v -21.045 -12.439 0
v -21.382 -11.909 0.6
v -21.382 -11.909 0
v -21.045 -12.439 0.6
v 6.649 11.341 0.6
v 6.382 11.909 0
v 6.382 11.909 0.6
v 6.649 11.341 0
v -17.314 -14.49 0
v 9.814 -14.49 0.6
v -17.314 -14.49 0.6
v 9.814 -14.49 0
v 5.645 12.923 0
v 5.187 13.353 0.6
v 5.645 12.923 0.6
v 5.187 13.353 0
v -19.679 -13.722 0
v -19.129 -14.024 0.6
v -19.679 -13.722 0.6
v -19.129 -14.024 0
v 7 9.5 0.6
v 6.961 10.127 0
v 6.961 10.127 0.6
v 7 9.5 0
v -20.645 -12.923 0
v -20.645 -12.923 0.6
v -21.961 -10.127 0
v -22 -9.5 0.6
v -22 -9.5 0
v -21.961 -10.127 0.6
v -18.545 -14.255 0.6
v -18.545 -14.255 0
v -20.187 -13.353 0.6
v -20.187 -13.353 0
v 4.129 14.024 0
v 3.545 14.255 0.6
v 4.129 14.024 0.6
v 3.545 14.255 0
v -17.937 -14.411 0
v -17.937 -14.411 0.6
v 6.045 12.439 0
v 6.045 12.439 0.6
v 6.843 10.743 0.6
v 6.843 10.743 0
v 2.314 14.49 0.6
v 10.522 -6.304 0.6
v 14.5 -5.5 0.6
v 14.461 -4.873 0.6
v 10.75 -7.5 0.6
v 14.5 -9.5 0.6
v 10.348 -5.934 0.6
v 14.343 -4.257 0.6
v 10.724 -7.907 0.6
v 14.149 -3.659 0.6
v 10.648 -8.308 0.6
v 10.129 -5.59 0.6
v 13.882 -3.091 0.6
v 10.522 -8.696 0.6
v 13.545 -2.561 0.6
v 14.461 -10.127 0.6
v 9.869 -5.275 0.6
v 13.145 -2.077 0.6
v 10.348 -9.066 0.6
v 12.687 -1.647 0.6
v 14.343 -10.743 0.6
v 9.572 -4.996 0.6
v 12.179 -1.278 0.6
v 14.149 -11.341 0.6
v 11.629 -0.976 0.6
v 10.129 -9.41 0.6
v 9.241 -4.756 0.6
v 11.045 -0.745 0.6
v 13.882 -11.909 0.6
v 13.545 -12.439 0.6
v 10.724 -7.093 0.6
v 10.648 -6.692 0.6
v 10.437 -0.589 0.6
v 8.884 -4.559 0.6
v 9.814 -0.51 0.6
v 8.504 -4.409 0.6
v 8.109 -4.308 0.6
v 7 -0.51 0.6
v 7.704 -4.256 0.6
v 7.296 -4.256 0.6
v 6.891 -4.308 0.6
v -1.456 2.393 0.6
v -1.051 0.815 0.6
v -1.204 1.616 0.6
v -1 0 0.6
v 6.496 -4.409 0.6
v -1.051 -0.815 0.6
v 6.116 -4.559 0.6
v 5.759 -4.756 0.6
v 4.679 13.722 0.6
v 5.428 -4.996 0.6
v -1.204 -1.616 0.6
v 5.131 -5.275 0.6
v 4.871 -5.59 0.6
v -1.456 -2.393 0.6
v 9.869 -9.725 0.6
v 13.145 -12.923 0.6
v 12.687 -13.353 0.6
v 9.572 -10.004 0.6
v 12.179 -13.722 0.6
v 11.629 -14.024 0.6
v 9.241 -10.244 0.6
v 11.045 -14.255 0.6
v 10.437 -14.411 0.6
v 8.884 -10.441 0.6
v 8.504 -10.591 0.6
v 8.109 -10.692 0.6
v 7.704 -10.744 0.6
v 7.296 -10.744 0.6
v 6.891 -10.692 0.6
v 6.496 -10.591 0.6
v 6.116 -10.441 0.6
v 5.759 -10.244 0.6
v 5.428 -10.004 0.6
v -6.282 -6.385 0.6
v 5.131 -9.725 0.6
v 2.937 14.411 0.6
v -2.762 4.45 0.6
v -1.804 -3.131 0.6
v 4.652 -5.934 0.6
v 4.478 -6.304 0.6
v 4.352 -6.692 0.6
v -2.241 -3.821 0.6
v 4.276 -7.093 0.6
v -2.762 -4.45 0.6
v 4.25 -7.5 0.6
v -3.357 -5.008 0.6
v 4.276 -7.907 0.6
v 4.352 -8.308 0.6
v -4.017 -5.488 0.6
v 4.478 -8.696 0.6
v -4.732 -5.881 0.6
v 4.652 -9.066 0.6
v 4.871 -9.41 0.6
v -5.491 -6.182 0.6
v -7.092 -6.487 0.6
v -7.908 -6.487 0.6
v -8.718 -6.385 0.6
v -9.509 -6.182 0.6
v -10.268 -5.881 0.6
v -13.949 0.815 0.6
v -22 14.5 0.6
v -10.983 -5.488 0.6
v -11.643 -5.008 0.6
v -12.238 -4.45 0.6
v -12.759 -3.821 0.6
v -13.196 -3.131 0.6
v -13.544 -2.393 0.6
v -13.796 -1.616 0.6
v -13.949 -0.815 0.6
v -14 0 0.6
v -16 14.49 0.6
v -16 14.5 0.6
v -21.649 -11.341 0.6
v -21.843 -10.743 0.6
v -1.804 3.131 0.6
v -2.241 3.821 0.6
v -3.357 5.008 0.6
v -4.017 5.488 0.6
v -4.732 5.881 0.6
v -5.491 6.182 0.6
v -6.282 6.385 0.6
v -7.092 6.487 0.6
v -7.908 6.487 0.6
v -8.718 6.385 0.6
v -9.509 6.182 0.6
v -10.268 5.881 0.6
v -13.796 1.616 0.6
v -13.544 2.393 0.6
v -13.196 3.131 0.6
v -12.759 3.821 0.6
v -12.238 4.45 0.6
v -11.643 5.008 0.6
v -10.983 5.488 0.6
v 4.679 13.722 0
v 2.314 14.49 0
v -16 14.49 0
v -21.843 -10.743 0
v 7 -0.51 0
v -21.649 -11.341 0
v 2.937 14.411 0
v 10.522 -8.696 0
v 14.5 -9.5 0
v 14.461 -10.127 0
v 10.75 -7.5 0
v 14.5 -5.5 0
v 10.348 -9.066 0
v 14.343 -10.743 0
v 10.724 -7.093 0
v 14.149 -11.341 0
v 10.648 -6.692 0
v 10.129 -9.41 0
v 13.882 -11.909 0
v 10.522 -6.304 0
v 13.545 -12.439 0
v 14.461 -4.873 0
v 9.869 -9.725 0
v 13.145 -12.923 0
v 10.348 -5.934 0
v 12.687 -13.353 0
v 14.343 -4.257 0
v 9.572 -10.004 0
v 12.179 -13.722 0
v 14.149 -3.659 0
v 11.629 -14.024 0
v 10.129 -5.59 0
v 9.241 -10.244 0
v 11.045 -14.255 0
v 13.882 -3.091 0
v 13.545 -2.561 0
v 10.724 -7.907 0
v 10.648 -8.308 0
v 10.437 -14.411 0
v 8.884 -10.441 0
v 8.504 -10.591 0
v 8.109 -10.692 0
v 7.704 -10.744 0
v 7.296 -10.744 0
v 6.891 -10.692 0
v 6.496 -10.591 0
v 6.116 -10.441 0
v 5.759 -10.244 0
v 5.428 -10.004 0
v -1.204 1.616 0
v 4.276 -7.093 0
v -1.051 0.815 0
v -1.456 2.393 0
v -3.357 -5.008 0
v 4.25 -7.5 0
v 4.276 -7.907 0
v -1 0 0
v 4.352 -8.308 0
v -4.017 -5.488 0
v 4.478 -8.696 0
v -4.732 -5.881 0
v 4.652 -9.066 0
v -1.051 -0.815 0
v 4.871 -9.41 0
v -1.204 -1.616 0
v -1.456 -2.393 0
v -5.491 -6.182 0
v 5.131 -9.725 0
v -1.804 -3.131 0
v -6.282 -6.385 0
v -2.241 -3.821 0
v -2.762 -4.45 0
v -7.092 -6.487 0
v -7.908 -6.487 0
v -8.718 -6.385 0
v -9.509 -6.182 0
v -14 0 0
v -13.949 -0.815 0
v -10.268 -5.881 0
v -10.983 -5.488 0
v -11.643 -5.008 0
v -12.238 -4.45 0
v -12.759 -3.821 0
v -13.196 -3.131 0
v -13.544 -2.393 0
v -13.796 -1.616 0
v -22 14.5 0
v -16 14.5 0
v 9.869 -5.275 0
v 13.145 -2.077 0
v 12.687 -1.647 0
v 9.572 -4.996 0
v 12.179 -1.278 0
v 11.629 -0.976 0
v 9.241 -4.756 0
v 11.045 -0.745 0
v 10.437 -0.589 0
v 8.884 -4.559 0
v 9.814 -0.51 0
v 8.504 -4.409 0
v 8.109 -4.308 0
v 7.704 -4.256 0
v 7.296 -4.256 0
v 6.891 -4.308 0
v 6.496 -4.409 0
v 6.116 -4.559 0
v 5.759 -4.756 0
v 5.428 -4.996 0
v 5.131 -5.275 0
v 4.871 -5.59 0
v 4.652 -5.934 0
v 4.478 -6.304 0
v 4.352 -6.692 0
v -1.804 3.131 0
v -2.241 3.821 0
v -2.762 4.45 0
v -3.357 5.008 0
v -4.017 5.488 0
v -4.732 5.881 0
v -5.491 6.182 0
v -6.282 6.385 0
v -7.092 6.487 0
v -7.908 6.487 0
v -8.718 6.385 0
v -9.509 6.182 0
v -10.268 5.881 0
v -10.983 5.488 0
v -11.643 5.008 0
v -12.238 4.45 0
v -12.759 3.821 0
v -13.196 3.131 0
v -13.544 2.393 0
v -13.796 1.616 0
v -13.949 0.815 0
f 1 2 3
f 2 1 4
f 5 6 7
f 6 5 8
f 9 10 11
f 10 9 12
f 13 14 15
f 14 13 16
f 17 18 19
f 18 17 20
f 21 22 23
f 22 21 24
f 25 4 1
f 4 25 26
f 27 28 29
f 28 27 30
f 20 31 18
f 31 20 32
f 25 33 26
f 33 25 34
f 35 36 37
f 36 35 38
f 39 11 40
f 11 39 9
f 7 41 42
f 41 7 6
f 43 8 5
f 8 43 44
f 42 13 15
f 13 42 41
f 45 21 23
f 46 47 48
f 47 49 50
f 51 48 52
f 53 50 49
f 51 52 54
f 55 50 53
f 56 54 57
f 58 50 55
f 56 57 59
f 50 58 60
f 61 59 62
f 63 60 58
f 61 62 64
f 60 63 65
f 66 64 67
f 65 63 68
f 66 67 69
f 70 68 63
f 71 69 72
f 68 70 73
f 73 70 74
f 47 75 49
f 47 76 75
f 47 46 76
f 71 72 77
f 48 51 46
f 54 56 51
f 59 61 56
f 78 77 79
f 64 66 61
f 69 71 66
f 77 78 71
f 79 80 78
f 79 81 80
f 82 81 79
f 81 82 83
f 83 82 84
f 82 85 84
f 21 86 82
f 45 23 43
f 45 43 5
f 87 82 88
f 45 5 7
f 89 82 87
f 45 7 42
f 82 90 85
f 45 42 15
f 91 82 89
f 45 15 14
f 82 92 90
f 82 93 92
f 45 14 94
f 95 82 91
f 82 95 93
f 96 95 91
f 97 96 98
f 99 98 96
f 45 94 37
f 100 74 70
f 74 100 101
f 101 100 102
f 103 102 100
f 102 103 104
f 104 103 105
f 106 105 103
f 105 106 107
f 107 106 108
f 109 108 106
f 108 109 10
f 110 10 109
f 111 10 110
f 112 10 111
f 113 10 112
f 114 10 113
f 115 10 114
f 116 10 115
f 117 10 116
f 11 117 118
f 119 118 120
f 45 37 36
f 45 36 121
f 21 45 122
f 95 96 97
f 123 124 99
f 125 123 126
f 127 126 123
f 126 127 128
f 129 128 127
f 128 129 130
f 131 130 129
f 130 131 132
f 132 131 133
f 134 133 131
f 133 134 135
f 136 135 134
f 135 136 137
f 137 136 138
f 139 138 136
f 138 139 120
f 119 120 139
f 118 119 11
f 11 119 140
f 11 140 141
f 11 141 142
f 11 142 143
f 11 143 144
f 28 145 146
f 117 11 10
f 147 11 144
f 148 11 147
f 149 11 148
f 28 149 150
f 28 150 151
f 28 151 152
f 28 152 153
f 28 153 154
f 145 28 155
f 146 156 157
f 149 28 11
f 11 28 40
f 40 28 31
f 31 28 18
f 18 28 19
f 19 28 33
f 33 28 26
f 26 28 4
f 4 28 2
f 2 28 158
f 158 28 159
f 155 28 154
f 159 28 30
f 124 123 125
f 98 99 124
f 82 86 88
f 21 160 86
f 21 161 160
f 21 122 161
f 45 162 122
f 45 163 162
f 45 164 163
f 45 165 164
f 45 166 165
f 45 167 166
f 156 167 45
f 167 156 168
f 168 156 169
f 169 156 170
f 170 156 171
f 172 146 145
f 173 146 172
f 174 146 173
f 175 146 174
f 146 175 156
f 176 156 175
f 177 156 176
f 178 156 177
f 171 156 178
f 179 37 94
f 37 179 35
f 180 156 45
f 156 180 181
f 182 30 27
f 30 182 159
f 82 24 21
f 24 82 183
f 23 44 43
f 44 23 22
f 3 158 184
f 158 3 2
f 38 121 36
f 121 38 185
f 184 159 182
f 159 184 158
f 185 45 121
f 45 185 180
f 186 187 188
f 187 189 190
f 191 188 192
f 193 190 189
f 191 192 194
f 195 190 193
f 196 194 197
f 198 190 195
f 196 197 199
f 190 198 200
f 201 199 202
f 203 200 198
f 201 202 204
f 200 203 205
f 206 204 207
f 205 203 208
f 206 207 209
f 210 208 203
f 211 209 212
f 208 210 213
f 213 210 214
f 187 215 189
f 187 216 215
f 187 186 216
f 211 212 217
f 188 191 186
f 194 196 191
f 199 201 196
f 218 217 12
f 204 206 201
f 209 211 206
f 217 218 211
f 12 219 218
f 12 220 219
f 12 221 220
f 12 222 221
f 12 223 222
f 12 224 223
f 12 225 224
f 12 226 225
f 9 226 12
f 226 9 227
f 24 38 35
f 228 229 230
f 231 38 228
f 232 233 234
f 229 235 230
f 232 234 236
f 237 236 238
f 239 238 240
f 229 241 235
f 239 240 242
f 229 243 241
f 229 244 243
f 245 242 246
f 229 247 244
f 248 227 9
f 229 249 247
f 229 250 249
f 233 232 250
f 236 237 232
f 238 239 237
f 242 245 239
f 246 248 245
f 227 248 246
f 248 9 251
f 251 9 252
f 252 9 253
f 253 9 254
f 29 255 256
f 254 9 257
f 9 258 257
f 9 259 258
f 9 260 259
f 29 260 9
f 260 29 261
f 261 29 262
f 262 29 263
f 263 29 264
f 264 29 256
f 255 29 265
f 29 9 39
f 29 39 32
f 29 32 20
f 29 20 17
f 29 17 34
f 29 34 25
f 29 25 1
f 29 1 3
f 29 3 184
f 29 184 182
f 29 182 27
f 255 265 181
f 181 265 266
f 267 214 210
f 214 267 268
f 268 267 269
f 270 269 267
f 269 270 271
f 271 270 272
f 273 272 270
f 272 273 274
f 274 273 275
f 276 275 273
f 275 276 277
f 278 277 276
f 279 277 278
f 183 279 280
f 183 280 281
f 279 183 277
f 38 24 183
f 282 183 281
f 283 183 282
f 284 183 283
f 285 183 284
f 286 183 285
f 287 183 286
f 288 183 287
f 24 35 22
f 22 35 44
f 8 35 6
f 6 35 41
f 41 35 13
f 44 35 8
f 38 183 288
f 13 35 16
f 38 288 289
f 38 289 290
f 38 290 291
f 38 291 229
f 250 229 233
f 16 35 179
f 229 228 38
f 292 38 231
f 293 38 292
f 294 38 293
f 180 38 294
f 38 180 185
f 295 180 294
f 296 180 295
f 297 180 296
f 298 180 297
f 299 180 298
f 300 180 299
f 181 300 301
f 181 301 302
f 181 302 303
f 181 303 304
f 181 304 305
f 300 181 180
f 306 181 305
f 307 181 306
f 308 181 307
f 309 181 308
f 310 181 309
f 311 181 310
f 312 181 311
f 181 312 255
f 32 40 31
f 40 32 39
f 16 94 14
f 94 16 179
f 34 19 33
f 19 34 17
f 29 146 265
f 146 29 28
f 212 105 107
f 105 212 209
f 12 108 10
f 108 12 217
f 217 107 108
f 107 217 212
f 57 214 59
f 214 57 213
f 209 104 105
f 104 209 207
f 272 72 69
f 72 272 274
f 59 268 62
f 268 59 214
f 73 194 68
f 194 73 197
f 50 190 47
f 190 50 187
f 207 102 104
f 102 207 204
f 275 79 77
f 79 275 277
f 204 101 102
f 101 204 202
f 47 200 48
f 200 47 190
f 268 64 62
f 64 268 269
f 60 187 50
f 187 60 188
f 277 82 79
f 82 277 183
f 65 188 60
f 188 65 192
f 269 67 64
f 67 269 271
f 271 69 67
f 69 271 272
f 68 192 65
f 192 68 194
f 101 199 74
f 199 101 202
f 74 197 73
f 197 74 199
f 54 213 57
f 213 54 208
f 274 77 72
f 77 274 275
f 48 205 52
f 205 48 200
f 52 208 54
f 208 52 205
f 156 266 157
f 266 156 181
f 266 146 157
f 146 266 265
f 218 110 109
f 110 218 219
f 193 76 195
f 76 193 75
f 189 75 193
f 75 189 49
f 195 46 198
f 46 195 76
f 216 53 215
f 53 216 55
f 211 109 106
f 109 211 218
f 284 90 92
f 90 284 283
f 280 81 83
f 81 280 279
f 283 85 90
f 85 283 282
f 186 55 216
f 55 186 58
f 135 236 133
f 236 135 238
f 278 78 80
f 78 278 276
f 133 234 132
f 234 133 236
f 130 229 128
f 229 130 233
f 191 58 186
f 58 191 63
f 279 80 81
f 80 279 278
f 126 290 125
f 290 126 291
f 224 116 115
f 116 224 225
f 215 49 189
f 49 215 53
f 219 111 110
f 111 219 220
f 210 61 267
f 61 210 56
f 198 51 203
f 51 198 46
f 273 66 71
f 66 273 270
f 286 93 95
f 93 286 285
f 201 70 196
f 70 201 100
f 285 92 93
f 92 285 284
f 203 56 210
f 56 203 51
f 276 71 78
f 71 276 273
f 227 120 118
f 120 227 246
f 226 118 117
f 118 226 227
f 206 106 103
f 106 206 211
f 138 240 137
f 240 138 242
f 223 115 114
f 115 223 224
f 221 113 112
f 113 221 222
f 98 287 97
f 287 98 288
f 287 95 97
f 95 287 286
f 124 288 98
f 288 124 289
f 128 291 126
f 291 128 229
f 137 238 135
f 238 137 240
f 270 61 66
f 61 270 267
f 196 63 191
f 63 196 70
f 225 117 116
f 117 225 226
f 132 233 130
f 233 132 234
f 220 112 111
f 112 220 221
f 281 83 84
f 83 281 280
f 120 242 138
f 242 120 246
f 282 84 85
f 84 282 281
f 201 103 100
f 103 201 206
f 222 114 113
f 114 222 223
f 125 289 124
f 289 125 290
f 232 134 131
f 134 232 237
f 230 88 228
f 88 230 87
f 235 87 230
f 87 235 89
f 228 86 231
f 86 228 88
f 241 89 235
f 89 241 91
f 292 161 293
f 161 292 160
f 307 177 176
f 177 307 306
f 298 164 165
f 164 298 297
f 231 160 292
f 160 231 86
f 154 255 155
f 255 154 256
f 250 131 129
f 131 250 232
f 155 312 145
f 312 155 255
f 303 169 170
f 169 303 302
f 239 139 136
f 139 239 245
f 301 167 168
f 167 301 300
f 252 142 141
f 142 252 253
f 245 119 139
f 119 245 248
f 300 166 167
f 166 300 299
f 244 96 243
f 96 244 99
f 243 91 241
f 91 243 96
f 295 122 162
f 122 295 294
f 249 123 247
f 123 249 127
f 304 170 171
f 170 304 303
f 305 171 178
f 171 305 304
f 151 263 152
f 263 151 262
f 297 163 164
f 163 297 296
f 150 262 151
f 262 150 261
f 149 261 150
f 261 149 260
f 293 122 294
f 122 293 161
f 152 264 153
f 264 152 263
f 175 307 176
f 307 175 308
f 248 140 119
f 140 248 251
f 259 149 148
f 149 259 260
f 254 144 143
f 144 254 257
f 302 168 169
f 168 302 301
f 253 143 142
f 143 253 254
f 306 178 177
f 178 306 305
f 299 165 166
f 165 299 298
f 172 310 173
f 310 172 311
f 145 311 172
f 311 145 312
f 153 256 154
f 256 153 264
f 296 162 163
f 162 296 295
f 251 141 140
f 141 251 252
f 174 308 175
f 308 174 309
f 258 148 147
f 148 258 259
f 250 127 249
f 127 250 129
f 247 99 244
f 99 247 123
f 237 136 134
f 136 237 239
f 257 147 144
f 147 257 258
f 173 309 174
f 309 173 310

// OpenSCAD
$fn = 50;


difference() {
	union() {
		translate(v = [-7.5000000000, 0, 0]) {
			hull() {
				translate(v = [-9.5000000000, 9.5000000000, 0]) {
					cylinder(h = 0.6000000000, r = 5);
				}
				translate(v = [9.5000000000, 9.5000000000, 0]) {
					cylinder(h = 0.6000000000, r = 5);
				}
				translate(v = [-9.5000000000, -9.5000000000, 0]) {
					cylinder(h = 0.6000000000, r = 5);
				}
				translate(v = [9.5000000000, -9.5000000000, 0]) {
					cylinder(h = 0.6000000000, r = 5);
				}
			}
		}
		translate(v = [0.0000000000, -7.5000000000, 0]) {
			hull() {
				translate(v = [-9.5000000000, 2.0000000000, 0]) {
					cylinder(h = 0.6000000000, r = 5);
				}
				translate(v = [9.5000000000, 2.0000000000, 0]) {
					cylinder(h = 0.6000000000, r = 5);
				}
				translate(v = [-9.5000000000, -2.0000000000, 0]) {
					cylinder(h = 0.6000000000, r = 5);
				}
				translate(v = [9.5000000000, -2.0000000000, 0]) {
					cylinder(h = 0.6000000000, r = 5);
				}
			}
		}
		translate(v = [-22.0000000000, 8.5000000000, 0]) {
			cube(size = [6, 6, 0.6000000000]);
		}
	}
	union() {
		translate(v = [7.5000000000, -7.5000000000, -50.0000000000]) {
			cylinder(h = 100, r = 3.2500000000);
		}
		translate(v = [-7.5000000000, 0, 0.0000000000]) {
			cylinder(h = 0.6000000000, r = 6.5000000000);
		}
	}
}
